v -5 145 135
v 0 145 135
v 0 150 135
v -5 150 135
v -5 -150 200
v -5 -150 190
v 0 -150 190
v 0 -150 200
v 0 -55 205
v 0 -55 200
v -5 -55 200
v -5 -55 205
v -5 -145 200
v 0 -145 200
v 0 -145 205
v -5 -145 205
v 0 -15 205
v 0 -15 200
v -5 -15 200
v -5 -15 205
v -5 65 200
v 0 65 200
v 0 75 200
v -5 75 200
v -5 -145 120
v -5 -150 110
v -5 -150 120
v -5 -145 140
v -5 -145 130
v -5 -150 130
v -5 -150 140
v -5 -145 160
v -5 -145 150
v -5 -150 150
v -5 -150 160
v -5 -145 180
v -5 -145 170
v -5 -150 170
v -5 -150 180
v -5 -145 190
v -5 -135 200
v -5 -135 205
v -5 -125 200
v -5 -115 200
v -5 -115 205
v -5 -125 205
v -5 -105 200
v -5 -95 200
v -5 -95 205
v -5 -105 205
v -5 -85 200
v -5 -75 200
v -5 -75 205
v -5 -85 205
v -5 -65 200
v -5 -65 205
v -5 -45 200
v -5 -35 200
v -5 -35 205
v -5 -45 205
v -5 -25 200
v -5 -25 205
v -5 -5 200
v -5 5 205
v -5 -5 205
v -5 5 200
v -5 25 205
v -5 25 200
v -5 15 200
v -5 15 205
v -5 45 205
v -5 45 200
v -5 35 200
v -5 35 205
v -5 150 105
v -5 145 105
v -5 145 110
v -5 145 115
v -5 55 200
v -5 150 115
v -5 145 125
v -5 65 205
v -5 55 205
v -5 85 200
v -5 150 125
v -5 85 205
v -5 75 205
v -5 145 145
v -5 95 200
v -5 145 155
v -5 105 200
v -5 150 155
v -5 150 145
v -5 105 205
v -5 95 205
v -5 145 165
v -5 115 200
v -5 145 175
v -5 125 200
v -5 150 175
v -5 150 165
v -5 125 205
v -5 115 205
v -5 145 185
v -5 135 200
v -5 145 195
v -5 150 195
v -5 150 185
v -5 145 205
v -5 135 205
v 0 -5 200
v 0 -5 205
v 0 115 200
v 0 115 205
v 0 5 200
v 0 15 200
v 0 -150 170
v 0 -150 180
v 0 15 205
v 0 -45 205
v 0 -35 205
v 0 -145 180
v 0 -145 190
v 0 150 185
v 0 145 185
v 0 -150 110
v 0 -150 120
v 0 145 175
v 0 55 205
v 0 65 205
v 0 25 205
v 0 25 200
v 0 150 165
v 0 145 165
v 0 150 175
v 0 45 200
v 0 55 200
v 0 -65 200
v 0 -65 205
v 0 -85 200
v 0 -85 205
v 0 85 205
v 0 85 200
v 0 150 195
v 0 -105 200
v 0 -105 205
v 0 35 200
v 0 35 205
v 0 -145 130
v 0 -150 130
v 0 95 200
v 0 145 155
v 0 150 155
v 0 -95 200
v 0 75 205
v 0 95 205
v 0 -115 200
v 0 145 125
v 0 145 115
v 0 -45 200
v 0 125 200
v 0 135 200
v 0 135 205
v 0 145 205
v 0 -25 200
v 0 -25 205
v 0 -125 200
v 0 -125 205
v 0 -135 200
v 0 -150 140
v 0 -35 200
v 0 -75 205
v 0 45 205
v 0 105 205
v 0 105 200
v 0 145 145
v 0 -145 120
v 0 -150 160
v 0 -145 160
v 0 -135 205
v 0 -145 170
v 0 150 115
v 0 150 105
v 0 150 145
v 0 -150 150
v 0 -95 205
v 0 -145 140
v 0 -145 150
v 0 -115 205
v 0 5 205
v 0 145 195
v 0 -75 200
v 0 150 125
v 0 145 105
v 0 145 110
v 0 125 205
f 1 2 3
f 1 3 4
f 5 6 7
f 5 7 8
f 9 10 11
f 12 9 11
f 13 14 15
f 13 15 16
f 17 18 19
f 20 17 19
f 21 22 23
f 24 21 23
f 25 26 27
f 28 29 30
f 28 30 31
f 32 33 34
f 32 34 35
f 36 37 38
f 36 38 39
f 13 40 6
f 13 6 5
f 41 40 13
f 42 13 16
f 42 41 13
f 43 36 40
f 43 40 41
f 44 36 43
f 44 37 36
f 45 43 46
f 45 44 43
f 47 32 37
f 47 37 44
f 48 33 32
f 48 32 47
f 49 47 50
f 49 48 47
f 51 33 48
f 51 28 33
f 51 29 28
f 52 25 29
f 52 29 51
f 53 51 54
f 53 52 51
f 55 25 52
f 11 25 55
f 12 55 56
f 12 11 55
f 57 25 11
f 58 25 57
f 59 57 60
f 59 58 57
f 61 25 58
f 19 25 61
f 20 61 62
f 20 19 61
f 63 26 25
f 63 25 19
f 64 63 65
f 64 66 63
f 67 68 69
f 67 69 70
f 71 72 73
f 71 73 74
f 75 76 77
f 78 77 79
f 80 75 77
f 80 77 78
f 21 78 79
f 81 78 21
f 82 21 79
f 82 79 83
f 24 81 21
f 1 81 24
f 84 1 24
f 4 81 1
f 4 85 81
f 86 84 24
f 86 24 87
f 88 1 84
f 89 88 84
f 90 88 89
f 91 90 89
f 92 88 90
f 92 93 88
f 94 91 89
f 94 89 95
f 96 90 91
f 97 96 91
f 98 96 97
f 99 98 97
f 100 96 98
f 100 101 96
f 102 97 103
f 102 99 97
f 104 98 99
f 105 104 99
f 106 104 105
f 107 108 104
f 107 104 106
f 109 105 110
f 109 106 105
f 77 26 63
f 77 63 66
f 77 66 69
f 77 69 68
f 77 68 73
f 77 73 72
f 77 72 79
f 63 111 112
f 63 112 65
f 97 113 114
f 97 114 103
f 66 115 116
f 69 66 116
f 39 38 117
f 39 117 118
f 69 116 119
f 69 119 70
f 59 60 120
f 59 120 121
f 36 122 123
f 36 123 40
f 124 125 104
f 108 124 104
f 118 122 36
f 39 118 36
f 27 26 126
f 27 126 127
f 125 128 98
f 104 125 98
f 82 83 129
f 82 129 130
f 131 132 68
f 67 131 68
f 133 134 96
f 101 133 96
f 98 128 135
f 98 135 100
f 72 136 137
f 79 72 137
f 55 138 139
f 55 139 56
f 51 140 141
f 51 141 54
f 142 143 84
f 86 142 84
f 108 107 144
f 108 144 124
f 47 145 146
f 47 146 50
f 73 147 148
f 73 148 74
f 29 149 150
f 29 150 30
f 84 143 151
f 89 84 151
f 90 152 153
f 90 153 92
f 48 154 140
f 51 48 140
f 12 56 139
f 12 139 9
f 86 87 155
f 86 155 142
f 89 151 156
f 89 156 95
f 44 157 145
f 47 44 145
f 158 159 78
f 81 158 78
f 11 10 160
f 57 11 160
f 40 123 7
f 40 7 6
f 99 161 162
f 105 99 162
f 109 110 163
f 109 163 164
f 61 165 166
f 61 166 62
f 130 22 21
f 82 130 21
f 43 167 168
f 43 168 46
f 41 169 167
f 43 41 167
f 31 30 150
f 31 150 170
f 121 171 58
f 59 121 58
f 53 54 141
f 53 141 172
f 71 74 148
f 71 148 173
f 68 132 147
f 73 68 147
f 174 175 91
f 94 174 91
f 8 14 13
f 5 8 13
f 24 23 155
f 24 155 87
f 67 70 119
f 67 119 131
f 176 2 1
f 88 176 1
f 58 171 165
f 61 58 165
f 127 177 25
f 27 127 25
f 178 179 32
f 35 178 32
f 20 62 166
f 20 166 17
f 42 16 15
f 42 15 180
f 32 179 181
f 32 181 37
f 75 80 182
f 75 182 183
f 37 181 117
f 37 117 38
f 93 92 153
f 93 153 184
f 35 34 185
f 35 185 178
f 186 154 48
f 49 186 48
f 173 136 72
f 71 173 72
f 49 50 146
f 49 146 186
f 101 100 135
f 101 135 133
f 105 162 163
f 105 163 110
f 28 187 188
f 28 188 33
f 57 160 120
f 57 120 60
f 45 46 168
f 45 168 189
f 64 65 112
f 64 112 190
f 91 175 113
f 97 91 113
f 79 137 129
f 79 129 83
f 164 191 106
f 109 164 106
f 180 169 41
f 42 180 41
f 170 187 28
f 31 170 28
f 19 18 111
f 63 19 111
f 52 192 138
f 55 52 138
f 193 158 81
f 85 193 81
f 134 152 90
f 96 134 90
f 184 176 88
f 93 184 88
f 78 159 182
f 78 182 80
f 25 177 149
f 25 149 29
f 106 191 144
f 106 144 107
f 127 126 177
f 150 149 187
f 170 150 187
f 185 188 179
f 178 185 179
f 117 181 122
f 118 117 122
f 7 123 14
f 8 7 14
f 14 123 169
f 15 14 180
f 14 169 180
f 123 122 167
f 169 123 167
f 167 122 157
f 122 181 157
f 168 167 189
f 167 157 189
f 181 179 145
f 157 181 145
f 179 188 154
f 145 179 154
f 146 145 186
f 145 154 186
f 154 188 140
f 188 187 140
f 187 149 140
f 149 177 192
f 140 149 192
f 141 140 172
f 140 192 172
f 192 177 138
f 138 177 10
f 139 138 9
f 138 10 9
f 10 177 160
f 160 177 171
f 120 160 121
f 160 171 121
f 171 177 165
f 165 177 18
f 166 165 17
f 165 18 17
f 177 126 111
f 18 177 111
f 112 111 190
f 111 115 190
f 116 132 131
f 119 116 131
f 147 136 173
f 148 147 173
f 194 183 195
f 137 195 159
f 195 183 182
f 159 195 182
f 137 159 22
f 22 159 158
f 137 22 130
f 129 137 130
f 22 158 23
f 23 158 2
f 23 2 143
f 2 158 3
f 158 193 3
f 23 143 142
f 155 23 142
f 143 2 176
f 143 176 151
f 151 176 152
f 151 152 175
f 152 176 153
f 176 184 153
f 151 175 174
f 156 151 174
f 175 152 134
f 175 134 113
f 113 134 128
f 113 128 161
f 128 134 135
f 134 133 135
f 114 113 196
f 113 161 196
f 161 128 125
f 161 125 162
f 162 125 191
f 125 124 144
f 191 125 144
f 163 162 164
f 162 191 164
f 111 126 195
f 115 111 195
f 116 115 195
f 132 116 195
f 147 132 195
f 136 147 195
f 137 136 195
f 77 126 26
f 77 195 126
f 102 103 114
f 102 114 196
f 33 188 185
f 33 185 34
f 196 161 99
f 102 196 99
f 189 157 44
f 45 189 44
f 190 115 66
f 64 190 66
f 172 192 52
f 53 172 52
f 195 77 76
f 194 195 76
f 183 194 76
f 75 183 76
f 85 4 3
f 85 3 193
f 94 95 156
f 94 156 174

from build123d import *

# Parameters (mm, degrees)
SKETCH012_W             = 90
SKETCH012_H             = 290
PAD010_DEPTH            = 5
SKETCH042_W             = 10
SKETCH042_H             = 5
PAD031_DEPTH            = 5
LINEARPATTERN022_COUNT  = 15
LINEARPATTERN022_PITCH  = 20
SKETCH043_W             = 10
SKETCH043_H             = 5
PAD032_DEPTH            = 5
LINEARPATTERN023_COUNT  = 5
LINEARPATTERN023_PITCH  = 20
SKETCH044_W             = 10
SKETCH044_H             = 5
PAD033_DEPTH            = 5
LINEARPATTERN024_COUNT  = 5
LINEARPATTERN024_PITCH  = 20
BODY010_PLACEMENT_ANGLE = 90


with BuildPart() as part:
    # Sketch012 → Pad010 (new body)
    with BuildSketch(Plane.XY):
        Rectangle(SKETCH012_W, SKETCH012_H)
    extrude(amount=PAD010_DEPTH)

    # Sketch042 (on DatumPlane) → Pad031 (join)
    with BuildSketch(Plane.YZ.offset(45)):
        with Locations((-140, 2.5)):
            Rectangle(SKETCH042_W, SKETCH042_H)
    pad031 = extrude(amount=PAD031_DEPTH)

    # LinearPattern022: Pad031 ×15
    with Locations(*[(0, i * LINEARPATTERN022_PITCH, 0) for i in range(1, LINEARPATTERN022_COUNT)]):
        add(pad031)

    # Sketch043 (on DatumPlane) → Pad032 (join)
    with BuildSketch(Plane(origin=(0, 145, 0), x_dir=(-1, 0, 0), z_dir=(0, 1, 0))):
        with Locations((-35, 2.5)):
            Rectangle(SKETCH043_W, SKETCH043_H)
    pad032 = extrude(amount=PAD032_DEPTH)

    # LinearPattern023: Pad032 ×5
    with Locations(*[(-i * LINEARPATTERN023_PITCH, 0, 0) for i in range(1, LINEARPATTERN023_COUNT)]):
        add(pad032)

    # Sketch044 (on DatumPlane) → Pad033 (join)
    with BuildSketch(Plane.XZ.offset(145)):
        with Locations((-40, 2.5)):
            Rectangle(SKETCH044_W, SKETCH044_H)
    pad033 = extrude(amount=PAD033_DEPTH)

    # LinearPattern024: Pad033 ×5
    with Locations(*[(i * LINEARPATTERN024_PITCH, 0, 0) for i in range(1, LINEARPATTERN024_COUNT)]):
        add(pad033)


with BuildPart() as part_1:
    # Body010 placement: moved
    add(part.part.moved(Location((0, 0, 155))).rotate(Axis((0, 0, 155), (0, -1, 0)), BODY010_PLACEMENT_ANGLE))


solid = part_1.part
